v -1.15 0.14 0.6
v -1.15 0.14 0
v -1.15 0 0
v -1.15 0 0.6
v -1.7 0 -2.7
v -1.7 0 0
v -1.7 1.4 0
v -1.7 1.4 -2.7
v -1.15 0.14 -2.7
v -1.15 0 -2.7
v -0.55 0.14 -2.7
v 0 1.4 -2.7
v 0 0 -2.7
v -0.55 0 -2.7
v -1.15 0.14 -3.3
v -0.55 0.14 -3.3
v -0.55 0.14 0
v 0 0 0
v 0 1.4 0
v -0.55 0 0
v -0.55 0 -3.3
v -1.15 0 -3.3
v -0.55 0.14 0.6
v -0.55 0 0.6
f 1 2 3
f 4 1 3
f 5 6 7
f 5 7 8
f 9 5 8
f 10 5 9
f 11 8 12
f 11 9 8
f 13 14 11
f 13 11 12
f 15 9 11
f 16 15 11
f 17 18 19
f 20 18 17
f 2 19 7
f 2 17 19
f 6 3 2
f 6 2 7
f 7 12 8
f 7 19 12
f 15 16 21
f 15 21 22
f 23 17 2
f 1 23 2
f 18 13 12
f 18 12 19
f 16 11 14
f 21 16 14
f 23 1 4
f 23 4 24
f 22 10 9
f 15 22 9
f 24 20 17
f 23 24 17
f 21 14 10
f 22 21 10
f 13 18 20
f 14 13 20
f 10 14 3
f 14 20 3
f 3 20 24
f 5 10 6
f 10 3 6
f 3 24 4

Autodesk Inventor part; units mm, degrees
ref_plane "YZ Plane" through (0, 0, 0) normal (1, 0, 0) x (0, 1, 0)
ref_plane "XZ Plane" through (0, 0, 0) normal (0, 1, 0) x (-1, 0, 0)
ref_plane "XY Plane" through (0, 0, 0) normal (0, 0, 1) x (1, 0, 0)
sketch "Sketch1" plane through (0, 0, 0) normal (0, 1, 0) x (-1, 0, 0)
  line L0 (0, 0) -> (1.7, 0)
  line L1 (1.7, 0) -> (1.7, -2.7)
  line L2 (1.7, -2.7) -> (0, -2.7)
  line L3 (0, -2.7) -> (0, 0)
  dimension "d0" = 1.7
  dimension "d1" = 2.7
extrude "Extrusion1" add sketch "Sketch1" along normal blind 1.4
sketch "Sketch2" plane through (-1.7, 0, 0) normal (0, 0, 1) x (1, 0, 0)
  line L0 (1.7, 0) -> (0, 0) projected
  line L1 (0.55, 0) -> (1.15, 0)
  line L2 (1.15, 0) -> (1.15, 0.14)
  line L3 (1.15, 0.14) -> (0.55, 0.14)
  line L4 (0.55, 0.14) -> (0.55, 0)
  line L5 (1.7, 0) -> (1.7, 1.4) projected
  dimension "d4" = 0.6
  dimension "d5" = 0.14
  dimension "d6" = 0.55
extrude "Extrusion2" add sketch "Sketch2" along normal blind 0.6
sketch "Sketch3" plane through (0, 0, -2.7) normal (0, 0, -1) x (-1, 0, 0)
  line L0 (0.55, 0) -> (1.15, 0)
  line L1 (1.15, 0) -> (1.15, 0.14)
  line L2 (1.15, 0.14) -> (0.55, 0.14)
  line L3 (0.55, 0.14) -> (0.55, 0)
  line L4 (1.7, 0) -> (1.7, 1.4) projected
  line L5 (0, 1.4) -> (1.7, 1.4) projected
  point P0 (0, 0)
  dimension "d9" = 0.6
  dimension "d10" = 0.14
  dimension "d11" = 0.55
  dimension "d12" = 1.4
extrude "Extrusion3" add sketch "Sketch3" along normal blind 0.6
sketch "Sketch4" plane through (0, 1.4, 0) normal (0, 1, 0) x (1, 0, 0)
  point P0 (0, 0)
properties part number "sod-123-model"
